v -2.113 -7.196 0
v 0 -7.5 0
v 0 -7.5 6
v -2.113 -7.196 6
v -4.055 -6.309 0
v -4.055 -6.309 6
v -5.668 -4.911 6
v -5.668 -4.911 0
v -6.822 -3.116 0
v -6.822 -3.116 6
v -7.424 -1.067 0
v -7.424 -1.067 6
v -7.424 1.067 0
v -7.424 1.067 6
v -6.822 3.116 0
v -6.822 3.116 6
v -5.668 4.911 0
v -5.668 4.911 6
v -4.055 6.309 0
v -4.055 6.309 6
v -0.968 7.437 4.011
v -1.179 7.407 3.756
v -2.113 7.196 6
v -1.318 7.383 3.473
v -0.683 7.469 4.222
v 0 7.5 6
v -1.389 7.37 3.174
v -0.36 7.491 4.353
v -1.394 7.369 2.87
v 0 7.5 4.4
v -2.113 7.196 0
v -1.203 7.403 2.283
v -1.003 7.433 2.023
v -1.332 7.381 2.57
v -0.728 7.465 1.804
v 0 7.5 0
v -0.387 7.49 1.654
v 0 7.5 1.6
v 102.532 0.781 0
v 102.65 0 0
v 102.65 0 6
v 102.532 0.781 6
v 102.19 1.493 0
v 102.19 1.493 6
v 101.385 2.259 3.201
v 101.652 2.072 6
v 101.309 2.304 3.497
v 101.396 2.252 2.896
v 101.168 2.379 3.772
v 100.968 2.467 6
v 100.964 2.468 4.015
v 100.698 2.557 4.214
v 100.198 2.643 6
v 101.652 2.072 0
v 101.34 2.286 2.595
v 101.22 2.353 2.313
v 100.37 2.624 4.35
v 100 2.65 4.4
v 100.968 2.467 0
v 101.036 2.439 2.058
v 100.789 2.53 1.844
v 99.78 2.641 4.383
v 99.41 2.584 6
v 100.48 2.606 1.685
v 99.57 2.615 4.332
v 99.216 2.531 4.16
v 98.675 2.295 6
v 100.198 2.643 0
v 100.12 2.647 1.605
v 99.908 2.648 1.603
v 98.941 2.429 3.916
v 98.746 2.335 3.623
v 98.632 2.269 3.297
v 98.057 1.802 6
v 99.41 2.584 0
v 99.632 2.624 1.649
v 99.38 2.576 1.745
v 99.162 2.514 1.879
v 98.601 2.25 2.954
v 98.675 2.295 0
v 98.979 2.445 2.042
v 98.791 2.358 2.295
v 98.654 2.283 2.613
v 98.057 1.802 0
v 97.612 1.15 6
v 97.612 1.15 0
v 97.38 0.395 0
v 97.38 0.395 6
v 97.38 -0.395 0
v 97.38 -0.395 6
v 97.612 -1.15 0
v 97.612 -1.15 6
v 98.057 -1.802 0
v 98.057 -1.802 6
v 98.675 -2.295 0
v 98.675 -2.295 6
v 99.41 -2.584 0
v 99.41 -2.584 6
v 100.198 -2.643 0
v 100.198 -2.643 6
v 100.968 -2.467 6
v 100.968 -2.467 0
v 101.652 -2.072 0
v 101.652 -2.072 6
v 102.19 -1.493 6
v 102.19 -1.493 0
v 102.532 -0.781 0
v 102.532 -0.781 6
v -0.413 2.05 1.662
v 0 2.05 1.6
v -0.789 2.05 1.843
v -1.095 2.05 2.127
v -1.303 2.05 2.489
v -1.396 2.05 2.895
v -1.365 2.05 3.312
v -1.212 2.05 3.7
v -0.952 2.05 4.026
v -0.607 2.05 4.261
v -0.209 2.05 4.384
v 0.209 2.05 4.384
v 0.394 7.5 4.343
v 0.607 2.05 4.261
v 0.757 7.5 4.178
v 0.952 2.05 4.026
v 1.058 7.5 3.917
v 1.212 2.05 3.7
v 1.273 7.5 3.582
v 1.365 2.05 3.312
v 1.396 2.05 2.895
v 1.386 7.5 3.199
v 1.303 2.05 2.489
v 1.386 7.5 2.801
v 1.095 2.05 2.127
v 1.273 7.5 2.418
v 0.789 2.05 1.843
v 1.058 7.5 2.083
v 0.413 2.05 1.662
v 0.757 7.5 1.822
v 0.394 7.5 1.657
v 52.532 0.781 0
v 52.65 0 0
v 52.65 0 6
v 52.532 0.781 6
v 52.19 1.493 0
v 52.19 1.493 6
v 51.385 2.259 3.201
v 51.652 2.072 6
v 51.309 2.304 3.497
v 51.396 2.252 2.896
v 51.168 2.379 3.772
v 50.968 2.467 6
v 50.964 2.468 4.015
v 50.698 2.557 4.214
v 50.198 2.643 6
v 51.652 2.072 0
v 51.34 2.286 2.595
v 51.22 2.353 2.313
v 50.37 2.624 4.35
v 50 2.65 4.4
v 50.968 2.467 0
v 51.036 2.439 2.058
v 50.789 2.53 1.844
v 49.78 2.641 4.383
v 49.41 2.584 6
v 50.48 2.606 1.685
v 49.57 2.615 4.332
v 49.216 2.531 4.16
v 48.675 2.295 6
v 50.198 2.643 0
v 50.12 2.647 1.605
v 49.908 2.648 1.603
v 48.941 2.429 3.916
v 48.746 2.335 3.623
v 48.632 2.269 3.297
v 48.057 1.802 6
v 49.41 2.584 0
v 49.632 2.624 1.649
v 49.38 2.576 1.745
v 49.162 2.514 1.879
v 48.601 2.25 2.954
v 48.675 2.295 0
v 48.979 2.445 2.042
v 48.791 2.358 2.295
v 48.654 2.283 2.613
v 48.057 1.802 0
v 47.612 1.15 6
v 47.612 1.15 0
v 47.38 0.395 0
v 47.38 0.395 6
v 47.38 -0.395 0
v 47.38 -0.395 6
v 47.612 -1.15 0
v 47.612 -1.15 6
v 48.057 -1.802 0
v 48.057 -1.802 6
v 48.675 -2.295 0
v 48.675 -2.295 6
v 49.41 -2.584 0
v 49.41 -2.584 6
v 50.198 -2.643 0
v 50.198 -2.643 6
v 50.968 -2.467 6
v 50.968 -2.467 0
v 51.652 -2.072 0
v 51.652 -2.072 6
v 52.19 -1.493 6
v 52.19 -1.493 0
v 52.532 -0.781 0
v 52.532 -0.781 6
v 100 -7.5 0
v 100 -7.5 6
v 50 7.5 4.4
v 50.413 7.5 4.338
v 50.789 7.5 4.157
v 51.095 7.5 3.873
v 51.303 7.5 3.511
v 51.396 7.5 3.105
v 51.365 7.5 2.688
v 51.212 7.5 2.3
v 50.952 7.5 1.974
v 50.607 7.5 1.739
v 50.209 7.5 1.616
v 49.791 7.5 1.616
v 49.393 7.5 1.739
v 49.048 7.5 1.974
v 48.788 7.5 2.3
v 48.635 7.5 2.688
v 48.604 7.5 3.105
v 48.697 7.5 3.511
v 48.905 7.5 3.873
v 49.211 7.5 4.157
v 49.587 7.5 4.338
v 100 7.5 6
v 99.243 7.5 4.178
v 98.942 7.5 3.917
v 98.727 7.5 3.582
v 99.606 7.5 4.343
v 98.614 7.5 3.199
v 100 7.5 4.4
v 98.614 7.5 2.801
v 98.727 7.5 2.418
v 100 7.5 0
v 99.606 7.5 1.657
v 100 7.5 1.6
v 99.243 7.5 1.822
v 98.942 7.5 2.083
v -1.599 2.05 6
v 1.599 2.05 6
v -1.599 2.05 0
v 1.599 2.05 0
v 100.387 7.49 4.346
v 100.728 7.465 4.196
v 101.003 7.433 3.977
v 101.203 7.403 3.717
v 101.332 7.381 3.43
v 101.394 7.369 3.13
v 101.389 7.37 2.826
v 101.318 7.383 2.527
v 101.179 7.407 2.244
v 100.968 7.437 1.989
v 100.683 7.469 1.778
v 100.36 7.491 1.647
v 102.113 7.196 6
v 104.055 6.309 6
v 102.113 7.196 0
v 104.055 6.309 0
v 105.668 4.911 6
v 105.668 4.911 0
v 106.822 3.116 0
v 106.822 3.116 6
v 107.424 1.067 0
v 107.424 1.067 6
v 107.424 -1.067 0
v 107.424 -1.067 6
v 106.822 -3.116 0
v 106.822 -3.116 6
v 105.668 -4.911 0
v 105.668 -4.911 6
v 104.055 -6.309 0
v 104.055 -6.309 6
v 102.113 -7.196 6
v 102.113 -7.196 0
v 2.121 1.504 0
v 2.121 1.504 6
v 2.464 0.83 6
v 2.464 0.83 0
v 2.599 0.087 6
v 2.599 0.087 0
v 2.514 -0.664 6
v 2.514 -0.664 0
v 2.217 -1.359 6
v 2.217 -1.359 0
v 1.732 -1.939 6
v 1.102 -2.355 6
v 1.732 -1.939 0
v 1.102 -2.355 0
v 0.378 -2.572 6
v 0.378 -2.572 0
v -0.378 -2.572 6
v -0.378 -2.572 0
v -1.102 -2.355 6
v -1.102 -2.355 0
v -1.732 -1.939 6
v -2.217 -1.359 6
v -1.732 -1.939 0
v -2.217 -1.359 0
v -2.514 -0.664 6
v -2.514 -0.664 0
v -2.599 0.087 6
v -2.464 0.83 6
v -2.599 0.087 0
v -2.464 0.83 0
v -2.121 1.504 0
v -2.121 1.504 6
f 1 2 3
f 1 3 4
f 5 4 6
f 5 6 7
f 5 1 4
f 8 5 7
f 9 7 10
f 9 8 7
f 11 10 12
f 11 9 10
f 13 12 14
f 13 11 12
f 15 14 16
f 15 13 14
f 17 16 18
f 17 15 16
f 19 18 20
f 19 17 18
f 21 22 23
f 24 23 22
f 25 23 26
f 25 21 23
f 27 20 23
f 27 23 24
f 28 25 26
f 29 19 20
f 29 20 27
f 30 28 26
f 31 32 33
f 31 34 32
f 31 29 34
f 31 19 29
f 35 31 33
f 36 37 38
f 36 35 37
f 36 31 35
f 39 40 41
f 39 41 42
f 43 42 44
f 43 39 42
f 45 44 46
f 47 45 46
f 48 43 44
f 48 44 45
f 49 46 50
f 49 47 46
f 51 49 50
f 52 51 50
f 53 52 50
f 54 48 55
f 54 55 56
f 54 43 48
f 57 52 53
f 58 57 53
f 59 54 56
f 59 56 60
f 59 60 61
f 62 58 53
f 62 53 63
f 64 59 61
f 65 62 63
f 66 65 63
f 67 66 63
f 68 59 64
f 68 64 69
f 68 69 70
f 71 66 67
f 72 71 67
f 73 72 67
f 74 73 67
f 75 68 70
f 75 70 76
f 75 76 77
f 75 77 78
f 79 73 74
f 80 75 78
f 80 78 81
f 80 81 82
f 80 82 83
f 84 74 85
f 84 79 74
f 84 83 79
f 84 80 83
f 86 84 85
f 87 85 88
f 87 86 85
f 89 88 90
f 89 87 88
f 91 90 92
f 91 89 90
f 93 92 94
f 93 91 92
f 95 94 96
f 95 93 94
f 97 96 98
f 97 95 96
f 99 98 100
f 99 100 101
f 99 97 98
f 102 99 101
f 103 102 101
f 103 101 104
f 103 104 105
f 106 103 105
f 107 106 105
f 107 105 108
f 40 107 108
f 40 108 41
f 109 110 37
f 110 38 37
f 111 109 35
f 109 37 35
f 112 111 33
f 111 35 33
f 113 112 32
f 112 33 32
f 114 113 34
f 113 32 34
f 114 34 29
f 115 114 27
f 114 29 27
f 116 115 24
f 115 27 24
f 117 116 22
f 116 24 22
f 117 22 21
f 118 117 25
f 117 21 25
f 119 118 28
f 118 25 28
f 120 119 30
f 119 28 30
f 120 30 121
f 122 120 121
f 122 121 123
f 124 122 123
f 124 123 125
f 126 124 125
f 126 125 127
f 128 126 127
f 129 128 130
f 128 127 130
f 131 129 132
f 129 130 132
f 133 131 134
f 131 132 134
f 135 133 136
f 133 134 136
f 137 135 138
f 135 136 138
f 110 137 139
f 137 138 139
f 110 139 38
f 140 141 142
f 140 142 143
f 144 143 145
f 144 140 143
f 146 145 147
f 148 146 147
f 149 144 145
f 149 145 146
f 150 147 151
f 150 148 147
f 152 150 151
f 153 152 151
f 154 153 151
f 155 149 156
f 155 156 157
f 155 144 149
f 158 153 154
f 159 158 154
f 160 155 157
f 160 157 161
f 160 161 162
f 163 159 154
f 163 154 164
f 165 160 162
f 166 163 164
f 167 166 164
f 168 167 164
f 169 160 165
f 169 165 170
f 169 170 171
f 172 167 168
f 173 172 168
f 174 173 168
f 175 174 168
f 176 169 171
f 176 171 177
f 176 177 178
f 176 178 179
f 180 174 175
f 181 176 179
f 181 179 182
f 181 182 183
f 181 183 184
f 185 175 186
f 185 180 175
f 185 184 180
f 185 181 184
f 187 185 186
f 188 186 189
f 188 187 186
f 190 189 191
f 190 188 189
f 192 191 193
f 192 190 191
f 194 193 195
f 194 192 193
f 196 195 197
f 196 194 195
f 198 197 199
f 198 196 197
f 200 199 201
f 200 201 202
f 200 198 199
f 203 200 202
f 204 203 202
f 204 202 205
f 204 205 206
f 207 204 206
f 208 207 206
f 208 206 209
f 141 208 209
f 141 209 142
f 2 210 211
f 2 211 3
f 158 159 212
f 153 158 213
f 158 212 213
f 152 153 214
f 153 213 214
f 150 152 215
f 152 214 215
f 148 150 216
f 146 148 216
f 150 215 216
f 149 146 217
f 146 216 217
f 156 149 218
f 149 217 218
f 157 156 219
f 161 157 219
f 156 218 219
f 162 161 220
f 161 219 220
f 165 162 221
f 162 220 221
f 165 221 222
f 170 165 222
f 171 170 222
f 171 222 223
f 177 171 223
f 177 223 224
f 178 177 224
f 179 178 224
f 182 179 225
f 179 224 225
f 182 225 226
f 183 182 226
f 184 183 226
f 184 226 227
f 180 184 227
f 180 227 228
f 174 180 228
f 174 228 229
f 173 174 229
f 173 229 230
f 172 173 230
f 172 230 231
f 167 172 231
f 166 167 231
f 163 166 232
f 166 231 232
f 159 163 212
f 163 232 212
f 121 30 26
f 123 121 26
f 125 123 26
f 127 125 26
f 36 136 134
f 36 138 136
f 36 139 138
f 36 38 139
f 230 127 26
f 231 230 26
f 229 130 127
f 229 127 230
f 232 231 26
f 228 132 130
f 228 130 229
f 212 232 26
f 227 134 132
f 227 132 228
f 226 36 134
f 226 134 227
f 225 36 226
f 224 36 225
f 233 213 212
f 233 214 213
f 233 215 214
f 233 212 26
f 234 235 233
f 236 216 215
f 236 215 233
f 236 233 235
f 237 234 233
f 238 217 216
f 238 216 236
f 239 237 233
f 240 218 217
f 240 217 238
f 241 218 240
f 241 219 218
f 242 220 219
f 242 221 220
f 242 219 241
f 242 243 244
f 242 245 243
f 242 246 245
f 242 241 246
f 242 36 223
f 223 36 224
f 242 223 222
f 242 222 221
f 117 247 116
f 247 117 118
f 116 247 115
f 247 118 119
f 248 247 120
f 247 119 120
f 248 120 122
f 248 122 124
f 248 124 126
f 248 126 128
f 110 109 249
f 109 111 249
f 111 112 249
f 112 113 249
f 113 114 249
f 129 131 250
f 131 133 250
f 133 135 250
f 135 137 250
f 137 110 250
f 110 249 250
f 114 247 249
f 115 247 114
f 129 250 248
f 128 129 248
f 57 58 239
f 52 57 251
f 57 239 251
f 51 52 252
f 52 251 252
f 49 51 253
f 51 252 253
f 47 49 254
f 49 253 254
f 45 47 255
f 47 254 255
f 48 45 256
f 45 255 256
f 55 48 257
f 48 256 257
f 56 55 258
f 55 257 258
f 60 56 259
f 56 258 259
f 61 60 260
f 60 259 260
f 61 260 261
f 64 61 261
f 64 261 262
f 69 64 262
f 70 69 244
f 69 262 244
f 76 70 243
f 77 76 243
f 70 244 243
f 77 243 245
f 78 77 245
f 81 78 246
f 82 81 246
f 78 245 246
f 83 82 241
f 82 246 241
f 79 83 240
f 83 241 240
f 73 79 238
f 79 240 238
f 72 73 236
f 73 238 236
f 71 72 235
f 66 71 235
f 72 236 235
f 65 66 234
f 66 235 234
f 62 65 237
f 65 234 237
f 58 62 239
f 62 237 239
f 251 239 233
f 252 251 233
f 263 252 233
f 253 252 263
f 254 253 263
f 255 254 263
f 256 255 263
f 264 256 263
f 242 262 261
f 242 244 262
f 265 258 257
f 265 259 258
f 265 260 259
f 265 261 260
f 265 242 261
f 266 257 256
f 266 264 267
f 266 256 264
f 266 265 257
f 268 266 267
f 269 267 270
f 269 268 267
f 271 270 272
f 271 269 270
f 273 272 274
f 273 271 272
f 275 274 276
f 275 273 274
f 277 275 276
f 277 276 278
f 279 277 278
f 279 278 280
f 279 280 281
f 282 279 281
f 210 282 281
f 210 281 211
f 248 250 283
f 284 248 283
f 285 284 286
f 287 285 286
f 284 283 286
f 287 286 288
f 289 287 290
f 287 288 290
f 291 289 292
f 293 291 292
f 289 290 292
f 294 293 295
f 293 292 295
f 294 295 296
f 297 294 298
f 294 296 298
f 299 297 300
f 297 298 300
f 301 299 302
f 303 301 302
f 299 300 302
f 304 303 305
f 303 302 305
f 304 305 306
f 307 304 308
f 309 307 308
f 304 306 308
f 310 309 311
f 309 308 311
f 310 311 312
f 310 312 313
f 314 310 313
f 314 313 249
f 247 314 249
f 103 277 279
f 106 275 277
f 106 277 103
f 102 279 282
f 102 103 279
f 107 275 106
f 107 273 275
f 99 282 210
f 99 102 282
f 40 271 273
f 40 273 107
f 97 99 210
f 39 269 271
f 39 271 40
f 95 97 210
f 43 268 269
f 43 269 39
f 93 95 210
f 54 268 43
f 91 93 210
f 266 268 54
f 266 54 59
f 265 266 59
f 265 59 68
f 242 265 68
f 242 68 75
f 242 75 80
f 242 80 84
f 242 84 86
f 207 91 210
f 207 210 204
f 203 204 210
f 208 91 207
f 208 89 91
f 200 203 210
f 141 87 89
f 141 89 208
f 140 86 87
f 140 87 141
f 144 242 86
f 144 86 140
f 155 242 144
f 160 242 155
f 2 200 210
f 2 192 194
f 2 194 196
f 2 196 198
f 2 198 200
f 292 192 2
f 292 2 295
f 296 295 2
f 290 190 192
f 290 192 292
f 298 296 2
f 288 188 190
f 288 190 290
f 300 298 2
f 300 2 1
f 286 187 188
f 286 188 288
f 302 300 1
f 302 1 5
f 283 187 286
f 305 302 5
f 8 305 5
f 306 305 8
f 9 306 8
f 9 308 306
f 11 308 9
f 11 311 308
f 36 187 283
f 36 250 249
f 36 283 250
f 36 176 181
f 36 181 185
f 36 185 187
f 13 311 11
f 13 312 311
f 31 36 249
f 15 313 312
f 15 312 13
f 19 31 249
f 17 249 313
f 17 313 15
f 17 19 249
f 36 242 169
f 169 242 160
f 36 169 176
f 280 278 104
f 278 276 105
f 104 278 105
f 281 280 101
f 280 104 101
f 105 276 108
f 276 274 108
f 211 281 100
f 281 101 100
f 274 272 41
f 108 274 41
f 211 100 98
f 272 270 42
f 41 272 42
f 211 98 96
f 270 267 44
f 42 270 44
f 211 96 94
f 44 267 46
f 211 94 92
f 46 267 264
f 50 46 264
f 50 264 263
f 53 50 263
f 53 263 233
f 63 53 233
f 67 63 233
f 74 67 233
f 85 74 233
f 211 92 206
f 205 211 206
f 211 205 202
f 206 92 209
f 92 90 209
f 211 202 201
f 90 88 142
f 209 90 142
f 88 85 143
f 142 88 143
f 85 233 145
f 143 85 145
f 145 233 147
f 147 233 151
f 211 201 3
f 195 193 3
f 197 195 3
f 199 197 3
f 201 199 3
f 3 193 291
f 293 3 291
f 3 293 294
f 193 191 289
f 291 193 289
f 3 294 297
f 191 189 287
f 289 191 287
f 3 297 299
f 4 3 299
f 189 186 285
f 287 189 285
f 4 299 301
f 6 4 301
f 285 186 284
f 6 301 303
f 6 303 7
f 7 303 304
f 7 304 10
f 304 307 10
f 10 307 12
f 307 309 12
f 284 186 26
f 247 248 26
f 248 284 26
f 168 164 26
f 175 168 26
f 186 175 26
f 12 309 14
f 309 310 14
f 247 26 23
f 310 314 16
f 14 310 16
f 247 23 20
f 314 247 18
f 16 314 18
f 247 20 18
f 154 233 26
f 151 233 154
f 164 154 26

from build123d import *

# Parameters (mm, degrees)
SKETCH1_R           = 2.65
BOSS_EXTRUDE1_DEPTH = 6
CUT_EXTRUDE1_REACH  = 110.707
SKETCH2_R           = 1.4


with BuildPart() as part:
    # Sketch1 → Boss-Extrude1 (new body)
    with BuildSketch(Plane.XY):
        with BuildLine():
            Line((0, 7.5), (100, 7.5))
            ThreePointArc((100, 7.5), (107.5, 0), (100, -7.5))
            Line((100, -7.5), (0, -7.5))
            ThreePointArc((0, -7.5), (-7.5, 0), (0, 7.5))
        make_face()
        with Locations((50, 0)):
            Circle(SKETCH1_R, mode=Mode.SUBTRACT)
        with Locations((100, 0)):
            Circle(SKETCH1_R, mode=Mode.SUBTRACT)
        with BuildLine():
            Line((-1.599218559, 2.05), (1.599218559, 2.05))
            ThreePointArc((1.599218559, 2.05), (0, -2.6), (-1.599218559, 2.05))
        make_face(mode=Mode.SUBTRACT)
    extrude(amount=BOSS_EXTRUDE1_DEPTH)

    # Sketch2 → Cut-Extrude1 (cut, up to next)
    with BuildSketch(Plane(origin=(0, 7.5, 0), x_dir=(1, 0, 0), z_dir=(0, 1, 0)), mode=Mode.PRIVATE) as cut_extrude1_sk1:
        with Locations(Location((0, -3, 0), (0, 0, 90))):
            Circle(SKETCH2_R)
    cut_extrude1_tool1 = extrude(cut_extrude1_sk1.sketch, amount=-CUT_EXTRUDE1_REACH, mode=Mode.PRIVATE) & part.part
    # Sketch2 → Cut-Extrude1 (cut, up to next)
    with BuildSketch(Plane(origin=(0, 7.5, 0), x_dir=(1, 0, 0), z_dir=(0, 1, 0)), mode=Mode.PRIVATE) as cut_extrude1_sk2:
        with Locations(Location((50, -3, 0), (0, 0, 270))):
            Circle(SKETCH2_R)
    cut_extrude1_tool2 = extrude(cut_extrude1_sk2.sketch, amount=-CUT_EXTRUDE1_REACH, mode=Mode.PRIVATE) & part.part
    # Sketch2 → Cut-Extrude1 (cut, up to next)
    with BuildSketch(Plane(origin=(0, 7.5, 0), x_dir=(1, 0, 0), z_dir=(0, 1, 0)), mode=Mode.PRIVATE) as cut_extrude1_sk3:
        with Locations(Location((100, -3, 0), (0, 0, 270))):
            Circle(SKETCH2_R)
    cut_extrude1_tool3 = extrude(cut_extrude1_sk3.sketch, amount=-CUT_EXTRUDE1_REACH, mode=Mode.PRIVATE) & part.part
    add(cut_extrude1_tool1.solids().sort_by_distance((0, 7.5, 3))[0], mode=Mode.SUBTRACT)
    add(cut_extrude1_tool2.solids().sort_by_distance((50, 7.5, 3))[0], mode=Mode.SUBTRACT)
    add(cut_extrude1_tool3.solids().sort_by_distance((100, 7.5, 3))[0], mode=Mode.SUBTRACT)


solid = part.part
